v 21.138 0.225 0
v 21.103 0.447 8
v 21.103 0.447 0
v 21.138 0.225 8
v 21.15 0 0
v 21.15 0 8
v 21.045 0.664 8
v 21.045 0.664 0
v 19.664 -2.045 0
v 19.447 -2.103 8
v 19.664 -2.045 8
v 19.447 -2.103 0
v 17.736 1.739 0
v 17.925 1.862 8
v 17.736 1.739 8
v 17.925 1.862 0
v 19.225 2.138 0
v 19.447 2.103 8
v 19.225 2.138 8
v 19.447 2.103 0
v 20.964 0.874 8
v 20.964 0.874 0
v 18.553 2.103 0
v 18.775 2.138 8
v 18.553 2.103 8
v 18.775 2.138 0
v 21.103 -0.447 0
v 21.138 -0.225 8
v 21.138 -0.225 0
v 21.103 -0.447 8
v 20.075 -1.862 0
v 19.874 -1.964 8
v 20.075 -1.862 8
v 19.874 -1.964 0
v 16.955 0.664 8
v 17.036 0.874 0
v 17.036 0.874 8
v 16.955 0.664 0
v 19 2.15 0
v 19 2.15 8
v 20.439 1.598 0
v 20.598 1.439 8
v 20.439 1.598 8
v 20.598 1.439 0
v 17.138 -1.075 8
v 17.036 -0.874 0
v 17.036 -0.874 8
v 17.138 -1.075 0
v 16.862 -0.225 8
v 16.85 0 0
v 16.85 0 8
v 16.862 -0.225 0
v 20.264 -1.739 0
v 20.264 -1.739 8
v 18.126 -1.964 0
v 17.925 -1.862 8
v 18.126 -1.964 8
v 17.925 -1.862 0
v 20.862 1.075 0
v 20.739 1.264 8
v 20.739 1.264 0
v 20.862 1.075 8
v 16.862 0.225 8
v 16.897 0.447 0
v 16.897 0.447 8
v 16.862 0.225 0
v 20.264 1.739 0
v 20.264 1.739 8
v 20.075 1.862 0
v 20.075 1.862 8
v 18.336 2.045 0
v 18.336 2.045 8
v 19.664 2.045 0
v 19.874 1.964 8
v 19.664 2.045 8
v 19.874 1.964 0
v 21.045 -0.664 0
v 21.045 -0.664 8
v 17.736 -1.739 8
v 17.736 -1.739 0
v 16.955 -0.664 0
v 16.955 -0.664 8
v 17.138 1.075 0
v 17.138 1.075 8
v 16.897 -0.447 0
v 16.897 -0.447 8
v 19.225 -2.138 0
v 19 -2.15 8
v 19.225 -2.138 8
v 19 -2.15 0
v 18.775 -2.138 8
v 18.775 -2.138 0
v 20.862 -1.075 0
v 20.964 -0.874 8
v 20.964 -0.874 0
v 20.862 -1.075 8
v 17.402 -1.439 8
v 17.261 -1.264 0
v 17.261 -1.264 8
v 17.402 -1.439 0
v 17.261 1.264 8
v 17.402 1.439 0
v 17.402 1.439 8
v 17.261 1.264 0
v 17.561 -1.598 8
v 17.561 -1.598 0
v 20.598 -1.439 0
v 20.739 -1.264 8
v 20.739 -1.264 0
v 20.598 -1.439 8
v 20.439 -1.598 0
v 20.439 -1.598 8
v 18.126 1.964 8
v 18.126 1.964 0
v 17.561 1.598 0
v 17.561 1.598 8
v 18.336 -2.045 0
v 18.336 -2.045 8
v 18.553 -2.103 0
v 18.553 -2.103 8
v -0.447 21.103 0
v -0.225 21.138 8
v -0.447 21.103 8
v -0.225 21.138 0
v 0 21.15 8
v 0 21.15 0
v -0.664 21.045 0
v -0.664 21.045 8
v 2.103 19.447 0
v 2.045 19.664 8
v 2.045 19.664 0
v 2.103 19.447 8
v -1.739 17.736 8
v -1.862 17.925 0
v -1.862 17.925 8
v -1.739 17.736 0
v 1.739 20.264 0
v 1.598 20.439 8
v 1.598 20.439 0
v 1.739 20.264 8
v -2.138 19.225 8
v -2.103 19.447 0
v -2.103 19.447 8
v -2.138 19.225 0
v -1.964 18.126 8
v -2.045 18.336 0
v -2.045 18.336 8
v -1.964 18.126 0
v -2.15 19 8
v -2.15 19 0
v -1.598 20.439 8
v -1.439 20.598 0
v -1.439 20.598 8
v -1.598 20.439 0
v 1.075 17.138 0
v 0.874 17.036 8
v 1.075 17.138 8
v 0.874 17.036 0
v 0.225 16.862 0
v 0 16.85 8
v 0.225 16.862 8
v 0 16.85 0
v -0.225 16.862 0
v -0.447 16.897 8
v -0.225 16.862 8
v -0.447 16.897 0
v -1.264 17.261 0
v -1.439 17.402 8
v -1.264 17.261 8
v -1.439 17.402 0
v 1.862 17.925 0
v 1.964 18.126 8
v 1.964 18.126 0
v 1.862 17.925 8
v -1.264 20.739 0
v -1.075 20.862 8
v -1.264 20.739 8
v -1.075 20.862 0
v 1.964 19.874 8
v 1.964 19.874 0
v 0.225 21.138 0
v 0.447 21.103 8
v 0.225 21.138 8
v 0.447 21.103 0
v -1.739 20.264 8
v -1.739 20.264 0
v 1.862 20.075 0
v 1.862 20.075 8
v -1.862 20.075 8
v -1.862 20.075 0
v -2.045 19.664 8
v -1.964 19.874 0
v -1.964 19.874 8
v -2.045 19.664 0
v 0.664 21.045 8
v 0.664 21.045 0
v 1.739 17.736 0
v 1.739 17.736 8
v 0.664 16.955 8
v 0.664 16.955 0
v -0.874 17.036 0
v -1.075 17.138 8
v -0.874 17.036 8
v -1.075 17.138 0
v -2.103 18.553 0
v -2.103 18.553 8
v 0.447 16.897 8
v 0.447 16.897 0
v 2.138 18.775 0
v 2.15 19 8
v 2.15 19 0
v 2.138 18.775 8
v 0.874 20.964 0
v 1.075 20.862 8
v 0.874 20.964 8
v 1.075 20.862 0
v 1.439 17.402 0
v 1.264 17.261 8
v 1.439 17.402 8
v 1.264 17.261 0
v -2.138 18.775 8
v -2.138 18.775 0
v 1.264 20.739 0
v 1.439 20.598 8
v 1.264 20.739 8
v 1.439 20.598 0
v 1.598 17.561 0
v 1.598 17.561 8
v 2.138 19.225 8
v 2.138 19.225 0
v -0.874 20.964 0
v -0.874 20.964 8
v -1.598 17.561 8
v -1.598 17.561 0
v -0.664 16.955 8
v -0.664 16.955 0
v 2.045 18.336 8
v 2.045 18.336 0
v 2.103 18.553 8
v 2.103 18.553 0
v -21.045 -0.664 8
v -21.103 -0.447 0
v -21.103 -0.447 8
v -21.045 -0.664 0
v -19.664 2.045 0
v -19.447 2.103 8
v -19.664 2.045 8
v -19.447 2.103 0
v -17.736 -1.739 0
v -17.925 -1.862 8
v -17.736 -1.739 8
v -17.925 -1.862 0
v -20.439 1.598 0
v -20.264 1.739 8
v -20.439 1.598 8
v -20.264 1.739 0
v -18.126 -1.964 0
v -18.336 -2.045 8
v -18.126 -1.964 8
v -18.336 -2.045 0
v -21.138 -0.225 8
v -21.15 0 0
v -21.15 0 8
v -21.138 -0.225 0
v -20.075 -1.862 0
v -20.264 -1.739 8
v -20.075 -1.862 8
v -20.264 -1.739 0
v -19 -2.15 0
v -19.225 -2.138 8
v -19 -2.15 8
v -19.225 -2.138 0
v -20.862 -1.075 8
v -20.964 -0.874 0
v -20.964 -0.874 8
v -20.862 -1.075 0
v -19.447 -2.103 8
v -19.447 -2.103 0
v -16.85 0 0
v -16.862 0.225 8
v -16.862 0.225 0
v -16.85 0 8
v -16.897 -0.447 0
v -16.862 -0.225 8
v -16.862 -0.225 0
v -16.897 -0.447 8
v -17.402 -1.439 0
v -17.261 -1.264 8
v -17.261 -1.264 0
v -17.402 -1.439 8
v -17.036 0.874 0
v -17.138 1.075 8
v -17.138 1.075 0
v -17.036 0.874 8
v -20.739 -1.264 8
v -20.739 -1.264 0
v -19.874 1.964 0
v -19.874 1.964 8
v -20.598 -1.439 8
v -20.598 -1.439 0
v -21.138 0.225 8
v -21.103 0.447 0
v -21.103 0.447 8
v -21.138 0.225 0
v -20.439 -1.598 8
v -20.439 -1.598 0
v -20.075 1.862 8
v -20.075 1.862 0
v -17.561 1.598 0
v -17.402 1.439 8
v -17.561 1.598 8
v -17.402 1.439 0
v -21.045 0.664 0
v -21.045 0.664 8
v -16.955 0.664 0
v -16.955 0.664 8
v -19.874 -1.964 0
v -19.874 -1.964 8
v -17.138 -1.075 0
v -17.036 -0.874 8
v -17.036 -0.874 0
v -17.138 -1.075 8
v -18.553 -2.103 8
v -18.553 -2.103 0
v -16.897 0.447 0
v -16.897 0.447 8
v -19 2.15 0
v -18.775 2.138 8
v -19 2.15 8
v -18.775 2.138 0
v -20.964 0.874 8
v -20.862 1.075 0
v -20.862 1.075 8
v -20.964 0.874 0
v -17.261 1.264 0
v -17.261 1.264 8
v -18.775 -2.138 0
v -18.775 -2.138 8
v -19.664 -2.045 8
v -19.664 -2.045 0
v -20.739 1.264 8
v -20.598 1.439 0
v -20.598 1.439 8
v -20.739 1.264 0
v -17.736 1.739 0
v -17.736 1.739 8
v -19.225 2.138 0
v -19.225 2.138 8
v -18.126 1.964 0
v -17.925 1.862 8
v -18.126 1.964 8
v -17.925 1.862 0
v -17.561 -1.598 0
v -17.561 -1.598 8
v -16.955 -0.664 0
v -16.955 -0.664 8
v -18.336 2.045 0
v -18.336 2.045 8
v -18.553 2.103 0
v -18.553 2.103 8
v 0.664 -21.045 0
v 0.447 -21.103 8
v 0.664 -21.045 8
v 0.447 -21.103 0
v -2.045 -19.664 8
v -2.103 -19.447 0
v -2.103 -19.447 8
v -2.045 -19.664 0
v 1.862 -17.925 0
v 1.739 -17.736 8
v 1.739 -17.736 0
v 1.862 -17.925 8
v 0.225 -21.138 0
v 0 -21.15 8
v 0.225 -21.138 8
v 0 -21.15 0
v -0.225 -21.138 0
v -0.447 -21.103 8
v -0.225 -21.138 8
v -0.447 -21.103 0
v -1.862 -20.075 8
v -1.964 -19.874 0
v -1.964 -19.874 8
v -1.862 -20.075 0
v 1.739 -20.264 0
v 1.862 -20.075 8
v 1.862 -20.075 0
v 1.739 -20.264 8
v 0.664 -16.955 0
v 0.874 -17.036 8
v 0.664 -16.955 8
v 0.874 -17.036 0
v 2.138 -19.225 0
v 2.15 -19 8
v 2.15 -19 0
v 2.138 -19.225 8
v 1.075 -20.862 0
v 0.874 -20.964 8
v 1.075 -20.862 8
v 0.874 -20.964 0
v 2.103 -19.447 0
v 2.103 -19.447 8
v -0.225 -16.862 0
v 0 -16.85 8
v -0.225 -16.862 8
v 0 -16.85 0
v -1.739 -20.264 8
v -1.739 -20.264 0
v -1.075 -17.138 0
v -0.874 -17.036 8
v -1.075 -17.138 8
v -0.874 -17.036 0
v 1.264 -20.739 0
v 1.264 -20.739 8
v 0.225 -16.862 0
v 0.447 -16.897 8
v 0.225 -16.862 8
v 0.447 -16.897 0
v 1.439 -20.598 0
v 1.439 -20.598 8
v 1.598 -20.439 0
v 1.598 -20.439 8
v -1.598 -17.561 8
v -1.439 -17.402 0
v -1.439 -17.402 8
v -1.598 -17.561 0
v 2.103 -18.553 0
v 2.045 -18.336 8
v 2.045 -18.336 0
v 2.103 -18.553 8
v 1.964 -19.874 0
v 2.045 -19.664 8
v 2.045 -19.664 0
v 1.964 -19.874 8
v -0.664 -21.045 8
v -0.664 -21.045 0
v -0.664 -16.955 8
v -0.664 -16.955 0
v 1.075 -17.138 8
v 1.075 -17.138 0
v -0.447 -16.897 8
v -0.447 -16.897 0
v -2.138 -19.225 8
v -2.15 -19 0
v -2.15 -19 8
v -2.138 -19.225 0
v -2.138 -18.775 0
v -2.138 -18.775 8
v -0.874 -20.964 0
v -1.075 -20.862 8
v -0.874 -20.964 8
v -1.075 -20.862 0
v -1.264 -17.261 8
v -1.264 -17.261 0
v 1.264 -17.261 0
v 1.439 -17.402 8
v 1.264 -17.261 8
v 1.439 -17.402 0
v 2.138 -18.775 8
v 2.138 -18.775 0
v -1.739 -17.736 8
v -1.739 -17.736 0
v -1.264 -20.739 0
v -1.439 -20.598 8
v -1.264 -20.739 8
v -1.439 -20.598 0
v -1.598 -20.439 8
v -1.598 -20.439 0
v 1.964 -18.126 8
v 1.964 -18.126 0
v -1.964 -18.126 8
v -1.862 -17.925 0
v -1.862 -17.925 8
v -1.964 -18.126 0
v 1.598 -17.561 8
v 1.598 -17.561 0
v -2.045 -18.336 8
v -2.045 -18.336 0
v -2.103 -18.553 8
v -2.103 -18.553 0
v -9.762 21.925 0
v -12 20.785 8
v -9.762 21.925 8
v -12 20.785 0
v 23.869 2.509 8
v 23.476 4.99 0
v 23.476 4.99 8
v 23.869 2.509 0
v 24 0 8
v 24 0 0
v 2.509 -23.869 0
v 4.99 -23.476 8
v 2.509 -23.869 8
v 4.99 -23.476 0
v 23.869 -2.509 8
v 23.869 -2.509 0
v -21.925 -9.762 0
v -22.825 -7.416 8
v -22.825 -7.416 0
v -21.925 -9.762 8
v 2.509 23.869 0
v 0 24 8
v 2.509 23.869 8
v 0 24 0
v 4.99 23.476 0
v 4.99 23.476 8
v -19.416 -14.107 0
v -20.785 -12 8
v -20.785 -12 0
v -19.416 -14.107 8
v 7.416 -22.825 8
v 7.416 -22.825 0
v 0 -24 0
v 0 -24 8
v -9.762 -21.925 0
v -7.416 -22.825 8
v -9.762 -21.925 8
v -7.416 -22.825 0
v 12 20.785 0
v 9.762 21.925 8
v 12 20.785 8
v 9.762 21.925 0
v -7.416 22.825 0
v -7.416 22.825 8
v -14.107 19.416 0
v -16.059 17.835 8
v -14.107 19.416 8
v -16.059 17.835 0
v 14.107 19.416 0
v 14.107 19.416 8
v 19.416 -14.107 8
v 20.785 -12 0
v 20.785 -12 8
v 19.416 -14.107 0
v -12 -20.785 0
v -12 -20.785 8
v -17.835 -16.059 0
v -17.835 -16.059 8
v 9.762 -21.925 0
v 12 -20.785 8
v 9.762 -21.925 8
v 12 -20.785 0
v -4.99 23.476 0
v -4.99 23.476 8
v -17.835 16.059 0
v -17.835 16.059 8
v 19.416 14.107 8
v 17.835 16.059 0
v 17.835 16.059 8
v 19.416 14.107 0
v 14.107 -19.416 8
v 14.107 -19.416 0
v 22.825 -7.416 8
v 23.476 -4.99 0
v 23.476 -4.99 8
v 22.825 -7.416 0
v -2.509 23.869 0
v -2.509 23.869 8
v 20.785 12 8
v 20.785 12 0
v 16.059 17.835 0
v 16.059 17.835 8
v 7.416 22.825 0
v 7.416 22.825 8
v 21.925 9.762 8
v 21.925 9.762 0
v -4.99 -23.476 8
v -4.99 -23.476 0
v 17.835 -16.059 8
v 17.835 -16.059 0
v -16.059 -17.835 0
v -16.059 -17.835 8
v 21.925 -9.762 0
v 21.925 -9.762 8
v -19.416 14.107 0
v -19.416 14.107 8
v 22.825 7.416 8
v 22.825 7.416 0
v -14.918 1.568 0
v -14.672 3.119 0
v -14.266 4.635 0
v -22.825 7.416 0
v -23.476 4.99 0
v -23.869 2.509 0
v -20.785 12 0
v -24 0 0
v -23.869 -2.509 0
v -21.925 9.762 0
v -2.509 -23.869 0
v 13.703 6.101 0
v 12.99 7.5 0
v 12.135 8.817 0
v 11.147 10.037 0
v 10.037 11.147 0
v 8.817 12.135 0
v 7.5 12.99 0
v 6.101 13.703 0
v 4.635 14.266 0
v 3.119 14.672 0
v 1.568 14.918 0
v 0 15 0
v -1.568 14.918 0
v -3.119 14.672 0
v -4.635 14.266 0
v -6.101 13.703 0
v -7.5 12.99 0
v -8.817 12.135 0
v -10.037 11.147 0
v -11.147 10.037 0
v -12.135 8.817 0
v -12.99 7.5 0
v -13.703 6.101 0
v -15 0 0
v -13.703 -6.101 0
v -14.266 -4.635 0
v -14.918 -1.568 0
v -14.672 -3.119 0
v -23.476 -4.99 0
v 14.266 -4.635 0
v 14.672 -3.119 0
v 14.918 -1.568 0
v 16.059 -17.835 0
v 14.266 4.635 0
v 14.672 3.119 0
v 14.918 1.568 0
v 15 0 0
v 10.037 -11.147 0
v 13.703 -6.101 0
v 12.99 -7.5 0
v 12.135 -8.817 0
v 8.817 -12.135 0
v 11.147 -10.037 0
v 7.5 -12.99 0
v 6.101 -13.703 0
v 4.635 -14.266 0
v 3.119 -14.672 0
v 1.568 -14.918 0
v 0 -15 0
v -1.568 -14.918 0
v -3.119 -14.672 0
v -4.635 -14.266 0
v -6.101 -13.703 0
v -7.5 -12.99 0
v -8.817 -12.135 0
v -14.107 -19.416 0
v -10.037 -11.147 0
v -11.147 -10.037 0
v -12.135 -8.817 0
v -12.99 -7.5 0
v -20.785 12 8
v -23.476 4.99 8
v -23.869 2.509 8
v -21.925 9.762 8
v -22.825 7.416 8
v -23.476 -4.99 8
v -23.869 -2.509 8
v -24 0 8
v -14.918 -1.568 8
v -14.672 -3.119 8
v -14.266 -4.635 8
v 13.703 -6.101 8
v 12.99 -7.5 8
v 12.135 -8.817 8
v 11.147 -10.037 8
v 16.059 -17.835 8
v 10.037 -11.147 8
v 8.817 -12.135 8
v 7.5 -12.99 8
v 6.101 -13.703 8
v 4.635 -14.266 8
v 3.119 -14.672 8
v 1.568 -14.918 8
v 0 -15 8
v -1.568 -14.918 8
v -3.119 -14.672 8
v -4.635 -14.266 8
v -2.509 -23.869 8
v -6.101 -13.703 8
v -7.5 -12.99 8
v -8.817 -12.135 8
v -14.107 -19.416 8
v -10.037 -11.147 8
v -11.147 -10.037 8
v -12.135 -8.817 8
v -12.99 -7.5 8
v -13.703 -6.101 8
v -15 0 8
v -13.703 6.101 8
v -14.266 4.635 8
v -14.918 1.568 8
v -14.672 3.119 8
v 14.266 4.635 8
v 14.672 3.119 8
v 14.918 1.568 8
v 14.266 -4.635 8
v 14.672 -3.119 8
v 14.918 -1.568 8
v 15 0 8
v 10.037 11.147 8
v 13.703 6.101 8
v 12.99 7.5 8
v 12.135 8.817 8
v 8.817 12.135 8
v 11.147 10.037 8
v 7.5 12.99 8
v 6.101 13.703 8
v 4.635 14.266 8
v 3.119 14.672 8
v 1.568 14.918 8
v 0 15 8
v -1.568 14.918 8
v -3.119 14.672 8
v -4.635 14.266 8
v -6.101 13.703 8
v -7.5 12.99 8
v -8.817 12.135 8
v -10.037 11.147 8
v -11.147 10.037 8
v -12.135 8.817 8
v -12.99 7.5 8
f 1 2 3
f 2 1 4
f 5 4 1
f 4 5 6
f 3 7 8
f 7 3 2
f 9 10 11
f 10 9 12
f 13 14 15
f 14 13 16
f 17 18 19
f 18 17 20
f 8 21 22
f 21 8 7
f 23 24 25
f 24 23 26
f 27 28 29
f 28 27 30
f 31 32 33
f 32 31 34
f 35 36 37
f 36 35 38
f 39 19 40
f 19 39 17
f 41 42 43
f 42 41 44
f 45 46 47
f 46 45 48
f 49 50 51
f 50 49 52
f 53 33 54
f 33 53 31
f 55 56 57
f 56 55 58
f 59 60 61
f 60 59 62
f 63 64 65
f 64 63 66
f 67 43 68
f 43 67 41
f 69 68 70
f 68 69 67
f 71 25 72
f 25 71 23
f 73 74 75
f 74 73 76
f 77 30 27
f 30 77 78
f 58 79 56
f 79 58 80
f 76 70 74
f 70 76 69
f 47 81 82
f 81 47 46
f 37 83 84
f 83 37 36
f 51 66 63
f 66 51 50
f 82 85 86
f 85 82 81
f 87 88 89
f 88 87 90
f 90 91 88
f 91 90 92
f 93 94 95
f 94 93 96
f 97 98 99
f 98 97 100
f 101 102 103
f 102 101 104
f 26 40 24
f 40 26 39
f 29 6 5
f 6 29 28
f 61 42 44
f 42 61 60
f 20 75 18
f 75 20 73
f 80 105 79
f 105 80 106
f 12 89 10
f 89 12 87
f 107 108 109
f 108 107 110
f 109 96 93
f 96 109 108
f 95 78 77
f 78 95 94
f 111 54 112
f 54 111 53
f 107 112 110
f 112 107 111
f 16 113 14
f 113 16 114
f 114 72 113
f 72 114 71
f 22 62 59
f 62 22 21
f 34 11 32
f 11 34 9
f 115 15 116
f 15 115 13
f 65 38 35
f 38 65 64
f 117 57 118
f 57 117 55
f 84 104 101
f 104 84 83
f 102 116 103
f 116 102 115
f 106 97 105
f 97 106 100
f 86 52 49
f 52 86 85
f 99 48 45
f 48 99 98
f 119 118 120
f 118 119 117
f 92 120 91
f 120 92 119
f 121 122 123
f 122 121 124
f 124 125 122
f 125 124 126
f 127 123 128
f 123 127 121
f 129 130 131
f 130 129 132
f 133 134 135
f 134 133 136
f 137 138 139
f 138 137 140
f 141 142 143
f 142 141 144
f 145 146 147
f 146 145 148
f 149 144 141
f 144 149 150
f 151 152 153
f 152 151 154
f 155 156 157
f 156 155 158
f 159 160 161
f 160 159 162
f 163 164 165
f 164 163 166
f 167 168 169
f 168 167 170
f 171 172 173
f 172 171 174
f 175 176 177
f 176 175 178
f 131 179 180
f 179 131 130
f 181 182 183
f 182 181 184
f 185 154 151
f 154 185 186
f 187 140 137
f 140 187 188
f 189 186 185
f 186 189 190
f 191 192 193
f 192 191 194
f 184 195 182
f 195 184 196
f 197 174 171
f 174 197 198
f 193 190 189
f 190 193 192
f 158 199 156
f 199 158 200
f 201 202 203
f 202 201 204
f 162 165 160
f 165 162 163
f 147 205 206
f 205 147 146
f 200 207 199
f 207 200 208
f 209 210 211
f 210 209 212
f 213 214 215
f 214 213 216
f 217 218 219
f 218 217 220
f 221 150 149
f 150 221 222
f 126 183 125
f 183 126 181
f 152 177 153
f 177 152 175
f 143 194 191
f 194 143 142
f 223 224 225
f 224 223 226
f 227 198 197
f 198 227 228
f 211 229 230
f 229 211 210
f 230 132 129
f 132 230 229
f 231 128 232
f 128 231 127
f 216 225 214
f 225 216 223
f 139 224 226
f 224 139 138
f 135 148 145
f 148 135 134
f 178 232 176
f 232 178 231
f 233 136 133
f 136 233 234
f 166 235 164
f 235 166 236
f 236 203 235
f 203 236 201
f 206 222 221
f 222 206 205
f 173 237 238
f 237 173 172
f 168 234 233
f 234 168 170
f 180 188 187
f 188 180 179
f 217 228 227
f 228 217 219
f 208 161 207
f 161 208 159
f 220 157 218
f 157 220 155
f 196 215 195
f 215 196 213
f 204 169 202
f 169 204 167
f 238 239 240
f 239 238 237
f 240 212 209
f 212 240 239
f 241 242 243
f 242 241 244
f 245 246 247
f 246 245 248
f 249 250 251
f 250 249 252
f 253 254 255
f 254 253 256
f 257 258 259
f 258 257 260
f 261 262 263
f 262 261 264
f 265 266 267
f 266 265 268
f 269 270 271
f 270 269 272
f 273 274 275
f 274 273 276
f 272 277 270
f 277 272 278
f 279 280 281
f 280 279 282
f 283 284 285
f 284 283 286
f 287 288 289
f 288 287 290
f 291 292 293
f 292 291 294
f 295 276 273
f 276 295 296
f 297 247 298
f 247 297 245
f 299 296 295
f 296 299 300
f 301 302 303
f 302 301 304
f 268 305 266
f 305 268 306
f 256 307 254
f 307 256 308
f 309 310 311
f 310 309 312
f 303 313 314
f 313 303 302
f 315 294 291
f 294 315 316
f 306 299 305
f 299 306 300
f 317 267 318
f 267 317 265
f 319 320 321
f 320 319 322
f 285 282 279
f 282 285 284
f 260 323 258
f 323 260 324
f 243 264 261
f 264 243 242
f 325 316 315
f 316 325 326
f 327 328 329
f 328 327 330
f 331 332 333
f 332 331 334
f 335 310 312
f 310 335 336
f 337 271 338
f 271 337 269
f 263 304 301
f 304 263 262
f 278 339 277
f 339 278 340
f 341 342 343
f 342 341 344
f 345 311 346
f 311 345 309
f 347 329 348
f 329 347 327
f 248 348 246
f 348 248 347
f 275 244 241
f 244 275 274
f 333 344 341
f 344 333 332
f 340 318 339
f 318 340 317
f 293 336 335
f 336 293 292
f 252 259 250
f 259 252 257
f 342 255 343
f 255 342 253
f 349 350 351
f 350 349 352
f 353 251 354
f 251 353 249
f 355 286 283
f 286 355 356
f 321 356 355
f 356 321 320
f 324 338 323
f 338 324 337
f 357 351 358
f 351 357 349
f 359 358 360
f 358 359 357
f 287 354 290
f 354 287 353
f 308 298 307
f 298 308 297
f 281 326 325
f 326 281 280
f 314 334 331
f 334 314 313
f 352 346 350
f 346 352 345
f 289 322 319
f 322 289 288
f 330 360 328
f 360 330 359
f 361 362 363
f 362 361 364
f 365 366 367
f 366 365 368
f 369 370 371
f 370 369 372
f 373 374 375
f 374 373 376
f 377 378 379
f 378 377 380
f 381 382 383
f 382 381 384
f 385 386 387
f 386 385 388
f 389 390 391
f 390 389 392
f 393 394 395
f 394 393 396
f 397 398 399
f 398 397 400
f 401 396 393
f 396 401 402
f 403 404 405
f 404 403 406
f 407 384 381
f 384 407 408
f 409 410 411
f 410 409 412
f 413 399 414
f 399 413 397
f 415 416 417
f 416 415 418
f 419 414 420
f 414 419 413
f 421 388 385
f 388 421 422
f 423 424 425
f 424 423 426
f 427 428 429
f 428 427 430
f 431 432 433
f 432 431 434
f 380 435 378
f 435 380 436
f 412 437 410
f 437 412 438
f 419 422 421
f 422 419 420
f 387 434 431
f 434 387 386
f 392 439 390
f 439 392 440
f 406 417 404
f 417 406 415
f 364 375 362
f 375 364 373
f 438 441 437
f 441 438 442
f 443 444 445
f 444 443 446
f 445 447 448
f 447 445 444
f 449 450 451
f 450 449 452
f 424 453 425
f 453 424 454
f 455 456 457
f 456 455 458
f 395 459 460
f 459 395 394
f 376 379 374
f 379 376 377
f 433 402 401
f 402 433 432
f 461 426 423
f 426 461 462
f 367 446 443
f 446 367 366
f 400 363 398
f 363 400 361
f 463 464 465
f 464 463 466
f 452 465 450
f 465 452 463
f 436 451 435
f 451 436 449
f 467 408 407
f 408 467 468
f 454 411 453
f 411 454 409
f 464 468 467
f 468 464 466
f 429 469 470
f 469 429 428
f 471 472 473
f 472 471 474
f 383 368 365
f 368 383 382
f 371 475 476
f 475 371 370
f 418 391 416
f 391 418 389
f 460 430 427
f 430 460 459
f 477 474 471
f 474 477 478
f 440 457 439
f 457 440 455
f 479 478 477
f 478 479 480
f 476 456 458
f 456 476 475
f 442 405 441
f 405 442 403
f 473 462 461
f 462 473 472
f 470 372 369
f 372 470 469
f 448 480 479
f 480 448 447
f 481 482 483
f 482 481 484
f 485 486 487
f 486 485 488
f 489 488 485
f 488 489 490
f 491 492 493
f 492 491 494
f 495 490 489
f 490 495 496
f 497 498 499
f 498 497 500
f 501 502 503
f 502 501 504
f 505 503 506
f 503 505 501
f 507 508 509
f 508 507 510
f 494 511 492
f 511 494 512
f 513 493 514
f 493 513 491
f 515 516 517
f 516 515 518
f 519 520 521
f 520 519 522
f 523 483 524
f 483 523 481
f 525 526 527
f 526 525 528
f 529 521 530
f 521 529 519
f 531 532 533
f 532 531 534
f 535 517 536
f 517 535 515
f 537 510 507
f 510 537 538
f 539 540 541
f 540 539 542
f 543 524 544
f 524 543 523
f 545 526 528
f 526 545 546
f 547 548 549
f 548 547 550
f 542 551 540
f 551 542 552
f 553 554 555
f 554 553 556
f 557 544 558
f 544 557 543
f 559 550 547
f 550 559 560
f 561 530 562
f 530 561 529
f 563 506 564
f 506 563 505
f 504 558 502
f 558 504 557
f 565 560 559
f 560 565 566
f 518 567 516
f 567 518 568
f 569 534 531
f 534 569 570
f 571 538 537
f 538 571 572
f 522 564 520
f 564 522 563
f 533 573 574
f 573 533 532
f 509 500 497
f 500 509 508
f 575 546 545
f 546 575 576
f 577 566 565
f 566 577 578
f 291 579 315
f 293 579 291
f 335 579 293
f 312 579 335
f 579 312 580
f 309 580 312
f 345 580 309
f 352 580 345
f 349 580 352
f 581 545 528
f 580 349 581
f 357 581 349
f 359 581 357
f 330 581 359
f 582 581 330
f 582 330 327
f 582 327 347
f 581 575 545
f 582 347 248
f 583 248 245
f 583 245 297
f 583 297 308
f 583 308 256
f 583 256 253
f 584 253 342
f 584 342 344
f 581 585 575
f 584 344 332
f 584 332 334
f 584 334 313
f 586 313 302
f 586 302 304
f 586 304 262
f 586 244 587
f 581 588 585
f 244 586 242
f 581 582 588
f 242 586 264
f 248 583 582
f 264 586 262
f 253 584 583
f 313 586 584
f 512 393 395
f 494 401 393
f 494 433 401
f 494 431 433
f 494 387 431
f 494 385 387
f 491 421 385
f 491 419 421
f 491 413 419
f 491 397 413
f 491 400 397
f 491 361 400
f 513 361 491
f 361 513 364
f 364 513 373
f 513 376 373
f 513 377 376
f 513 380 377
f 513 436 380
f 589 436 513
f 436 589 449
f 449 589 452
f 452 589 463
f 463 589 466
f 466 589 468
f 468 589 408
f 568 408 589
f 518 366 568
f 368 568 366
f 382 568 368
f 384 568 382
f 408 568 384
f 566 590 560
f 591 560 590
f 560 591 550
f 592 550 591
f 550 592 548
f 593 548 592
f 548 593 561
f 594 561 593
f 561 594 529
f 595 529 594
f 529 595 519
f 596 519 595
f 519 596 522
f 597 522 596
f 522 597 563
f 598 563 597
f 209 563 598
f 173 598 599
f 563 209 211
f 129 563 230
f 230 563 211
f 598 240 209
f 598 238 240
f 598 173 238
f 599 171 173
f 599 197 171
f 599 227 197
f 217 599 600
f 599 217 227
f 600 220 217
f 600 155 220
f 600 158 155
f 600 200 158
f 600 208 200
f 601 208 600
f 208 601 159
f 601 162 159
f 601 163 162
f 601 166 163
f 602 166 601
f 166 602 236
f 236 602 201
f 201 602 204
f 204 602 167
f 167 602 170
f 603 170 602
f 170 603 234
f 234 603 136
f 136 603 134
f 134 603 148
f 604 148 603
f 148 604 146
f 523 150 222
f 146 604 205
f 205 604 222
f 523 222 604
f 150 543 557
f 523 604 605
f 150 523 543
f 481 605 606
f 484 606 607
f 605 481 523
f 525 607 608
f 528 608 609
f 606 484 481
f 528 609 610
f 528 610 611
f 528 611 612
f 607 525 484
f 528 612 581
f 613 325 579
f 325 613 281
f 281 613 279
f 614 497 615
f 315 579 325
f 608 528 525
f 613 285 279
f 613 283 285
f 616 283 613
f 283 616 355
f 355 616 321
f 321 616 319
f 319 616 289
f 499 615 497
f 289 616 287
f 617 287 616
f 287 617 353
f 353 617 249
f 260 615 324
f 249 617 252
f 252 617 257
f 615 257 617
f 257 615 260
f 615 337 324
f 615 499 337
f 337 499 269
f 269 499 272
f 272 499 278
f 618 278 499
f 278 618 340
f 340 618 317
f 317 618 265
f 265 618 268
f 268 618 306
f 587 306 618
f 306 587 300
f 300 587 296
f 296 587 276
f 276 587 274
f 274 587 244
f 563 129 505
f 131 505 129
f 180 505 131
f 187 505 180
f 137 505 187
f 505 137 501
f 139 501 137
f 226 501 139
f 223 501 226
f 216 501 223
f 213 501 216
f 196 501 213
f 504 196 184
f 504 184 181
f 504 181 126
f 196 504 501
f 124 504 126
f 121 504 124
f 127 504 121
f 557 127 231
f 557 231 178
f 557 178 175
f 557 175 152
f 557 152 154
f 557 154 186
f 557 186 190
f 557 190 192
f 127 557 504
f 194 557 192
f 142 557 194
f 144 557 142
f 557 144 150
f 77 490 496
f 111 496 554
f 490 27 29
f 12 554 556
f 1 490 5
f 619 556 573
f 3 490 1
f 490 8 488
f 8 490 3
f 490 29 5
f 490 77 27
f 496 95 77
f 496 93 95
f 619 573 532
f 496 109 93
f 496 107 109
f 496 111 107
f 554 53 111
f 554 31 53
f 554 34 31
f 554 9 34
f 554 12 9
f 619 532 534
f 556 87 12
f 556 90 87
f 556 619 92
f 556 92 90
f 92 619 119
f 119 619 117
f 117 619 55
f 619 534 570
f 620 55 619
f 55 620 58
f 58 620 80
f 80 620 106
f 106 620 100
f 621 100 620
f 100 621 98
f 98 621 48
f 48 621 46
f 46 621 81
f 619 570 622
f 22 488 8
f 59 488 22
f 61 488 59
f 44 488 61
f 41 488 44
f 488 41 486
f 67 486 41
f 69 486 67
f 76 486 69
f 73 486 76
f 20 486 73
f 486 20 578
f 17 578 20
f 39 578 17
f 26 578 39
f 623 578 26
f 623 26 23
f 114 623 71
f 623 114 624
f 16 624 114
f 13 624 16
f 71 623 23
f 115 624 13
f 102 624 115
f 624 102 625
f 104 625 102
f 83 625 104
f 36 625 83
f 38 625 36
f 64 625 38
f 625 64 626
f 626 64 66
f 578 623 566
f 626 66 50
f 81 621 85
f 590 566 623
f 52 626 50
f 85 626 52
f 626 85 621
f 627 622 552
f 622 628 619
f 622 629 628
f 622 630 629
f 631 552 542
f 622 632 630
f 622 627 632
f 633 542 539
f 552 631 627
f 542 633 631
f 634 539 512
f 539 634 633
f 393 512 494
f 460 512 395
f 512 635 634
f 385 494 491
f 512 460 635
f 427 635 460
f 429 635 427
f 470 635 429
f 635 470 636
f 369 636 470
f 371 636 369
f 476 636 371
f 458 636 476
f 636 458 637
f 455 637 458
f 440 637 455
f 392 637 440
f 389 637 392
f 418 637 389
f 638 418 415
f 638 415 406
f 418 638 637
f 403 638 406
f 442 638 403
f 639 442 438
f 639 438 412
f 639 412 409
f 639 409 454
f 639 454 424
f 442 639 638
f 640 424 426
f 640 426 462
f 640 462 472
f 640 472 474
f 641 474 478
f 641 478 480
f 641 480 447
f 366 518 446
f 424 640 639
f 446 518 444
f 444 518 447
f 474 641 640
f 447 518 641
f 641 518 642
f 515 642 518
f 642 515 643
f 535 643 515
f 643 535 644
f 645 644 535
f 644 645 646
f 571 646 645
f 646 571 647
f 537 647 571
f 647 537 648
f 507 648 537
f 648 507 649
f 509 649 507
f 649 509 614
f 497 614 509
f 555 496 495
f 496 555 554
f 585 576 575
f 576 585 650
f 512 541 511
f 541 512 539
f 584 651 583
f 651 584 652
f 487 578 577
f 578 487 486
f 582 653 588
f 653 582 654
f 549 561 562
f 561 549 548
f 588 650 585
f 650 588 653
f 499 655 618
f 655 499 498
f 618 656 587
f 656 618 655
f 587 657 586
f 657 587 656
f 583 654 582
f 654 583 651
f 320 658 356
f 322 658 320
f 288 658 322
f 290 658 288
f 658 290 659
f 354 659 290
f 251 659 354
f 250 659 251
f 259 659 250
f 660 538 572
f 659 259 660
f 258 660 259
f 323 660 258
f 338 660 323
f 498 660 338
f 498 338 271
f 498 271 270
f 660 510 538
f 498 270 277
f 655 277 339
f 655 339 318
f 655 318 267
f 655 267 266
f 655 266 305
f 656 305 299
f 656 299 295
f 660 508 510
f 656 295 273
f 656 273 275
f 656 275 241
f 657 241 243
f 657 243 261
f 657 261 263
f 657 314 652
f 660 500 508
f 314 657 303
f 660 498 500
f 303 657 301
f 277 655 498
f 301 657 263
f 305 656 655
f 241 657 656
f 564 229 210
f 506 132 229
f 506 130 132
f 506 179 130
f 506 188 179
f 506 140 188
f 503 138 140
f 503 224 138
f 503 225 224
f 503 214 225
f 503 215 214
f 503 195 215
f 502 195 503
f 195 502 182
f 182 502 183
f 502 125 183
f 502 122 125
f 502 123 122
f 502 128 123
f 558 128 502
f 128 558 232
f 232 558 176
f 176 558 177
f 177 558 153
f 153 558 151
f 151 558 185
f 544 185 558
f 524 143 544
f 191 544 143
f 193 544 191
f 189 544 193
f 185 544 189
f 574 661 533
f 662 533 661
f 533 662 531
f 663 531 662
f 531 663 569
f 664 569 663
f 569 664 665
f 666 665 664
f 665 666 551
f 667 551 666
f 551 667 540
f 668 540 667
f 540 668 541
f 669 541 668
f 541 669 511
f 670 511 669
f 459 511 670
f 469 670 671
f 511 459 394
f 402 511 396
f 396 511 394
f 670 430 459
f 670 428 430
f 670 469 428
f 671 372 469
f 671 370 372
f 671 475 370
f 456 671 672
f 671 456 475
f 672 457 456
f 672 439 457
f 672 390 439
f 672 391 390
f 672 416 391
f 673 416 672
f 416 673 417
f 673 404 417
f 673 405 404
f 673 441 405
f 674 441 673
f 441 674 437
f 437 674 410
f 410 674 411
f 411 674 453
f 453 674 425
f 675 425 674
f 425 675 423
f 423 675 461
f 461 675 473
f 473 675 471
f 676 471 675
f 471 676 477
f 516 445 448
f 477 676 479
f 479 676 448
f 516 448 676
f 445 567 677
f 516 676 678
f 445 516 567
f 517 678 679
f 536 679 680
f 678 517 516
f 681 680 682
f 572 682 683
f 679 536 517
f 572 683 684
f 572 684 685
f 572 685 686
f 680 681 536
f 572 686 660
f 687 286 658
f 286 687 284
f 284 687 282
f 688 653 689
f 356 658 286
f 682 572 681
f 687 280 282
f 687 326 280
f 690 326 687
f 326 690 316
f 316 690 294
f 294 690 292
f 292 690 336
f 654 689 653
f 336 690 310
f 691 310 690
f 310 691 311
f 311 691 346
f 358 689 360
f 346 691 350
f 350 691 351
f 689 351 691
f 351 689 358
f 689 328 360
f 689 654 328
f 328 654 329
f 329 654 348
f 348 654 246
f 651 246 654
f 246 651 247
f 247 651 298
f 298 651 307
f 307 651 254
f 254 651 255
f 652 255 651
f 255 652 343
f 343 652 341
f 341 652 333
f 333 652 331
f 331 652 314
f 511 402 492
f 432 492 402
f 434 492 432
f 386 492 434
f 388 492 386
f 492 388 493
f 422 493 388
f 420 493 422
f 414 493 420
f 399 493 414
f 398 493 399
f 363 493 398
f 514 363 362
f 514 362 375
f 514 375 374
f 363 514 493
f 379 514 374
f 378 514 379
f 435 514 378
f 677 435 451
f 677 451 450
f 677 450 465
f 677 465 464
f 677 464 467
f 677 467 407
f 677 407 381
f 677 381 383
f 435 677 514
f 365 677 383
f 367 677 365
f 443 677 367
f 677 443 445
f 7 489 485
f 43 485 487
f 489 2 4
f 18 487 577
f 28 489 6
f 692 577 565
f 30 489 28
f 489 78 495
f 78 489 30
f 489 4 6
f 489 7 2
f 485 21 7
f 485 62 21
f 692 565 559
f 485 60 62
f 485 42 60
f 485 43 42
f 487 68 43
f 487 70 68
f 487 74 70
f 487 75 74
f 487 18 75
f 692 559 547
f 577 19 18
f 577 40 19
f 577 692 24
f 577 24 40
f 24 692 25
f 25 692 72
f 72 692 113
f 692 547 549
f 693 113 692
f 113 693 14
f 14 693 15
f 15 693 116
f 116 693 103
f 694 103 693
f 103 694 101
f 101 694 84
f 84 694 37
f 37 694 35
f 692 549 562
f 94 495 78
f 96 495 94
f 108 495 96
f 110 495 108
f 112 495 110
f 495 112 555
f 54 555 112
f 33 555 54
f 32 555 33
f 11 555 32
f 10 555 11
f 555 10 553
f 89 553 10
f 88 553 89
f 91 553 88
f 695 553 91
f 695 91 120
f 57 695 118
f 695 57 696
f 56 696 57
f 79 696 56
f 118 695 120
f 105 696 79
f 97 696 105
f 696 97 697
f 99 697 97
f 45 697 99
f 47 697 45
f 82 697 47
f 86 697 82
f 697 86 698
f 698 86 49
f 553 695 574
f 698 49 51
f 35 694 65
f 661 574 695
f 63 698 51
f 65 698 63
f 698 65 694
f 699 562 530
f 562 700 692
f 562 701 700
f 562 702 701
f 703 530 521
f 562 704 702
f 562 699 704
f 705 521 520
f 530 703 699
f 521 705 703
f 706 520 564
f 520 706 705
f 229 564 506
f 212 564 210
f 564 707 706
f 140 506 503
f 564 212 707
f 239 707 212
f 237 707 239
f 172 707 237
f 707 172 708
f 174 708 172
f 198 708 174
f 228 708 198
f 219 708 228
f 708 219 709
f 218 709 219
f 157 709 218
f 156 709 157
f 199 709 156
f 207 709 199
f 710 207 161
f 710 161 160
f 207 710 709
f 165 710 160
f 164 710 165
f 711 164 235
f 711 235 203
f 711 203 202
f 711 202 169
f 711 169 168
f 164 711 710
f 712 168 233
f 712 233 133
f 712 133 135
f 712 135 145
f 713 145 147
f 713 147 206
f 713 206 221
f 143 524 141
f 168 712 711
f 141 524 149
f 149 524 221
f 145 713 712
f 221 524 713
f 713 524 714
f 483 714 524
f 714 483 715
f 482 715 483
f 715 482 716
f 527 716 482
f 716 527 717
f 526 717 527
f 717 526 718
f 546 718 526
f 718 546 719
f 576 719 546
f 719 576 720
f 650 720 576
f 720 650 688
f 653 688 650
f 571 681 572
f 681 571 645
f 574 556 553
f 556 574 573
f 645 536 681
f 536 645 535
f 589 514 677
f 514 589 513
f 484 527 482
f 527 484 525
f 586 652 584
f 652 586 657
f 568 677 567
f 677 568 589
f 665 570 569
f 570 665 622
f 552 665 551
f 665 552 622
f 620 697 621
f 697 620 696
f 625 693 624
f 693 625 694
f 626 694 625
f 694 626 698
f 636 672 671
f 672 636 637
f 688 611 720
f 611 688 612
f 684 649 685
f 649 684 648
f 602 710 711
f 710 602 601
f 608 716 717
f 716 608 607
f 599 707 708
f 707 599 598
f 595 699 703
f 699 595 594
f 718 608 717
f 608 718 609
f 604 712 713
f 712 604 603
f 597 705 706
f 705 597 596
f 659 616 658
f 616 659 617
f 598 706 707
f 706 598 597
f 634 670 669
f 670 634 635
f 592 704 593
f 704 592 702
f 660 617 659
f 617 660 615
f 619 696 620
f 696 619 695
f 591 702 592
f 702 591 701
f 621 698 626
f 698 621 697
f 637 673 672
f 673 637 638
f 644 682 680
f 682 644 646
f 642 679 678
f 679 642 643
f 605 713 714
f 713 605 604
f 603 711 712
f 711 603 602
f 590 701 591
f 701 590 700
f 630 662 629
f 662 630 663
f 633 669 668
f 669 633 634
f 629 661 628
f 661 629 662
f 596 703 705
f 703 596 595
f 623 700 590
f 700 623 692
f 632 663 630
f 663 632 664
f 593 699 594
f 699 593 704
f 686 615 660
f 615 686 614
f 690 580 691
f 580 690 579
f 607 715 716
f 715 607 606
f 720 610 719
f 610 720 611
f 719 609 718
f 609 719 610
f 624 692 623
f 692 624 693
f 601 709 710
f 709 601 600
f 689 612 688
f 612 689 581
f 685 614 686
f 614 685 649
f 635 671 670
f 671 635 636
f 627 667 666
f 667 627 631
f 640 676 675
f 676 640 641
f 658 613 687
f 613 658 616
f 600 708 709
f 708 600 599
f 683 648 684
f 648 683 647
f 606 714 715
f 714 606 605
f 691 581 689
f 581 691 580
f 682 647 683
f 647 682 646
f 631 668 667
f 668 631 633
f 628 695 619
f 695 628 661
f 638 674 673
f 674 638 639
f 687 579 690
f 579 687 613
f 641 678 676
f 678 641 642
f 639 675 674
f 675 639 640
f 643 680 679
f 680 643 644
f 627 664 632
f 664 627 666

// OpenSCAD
// Shaft-seal holder plate.
$fn = 60;
eps = 0.02;
seal_d = 30;
outer_d = 48;
plate_t = 8;
difference() { cylinder(d=outer_d,h=plate_t); translate([0,0,-eps]) cylinder(d=seal_d,h=plate_t+2*eps); for(i=[0:3]) rotate([0,0,i*90]) translate([outer_d/2-5,0,-eps]) cylinder(d=4.3,h=plate_t+2*eps); }
